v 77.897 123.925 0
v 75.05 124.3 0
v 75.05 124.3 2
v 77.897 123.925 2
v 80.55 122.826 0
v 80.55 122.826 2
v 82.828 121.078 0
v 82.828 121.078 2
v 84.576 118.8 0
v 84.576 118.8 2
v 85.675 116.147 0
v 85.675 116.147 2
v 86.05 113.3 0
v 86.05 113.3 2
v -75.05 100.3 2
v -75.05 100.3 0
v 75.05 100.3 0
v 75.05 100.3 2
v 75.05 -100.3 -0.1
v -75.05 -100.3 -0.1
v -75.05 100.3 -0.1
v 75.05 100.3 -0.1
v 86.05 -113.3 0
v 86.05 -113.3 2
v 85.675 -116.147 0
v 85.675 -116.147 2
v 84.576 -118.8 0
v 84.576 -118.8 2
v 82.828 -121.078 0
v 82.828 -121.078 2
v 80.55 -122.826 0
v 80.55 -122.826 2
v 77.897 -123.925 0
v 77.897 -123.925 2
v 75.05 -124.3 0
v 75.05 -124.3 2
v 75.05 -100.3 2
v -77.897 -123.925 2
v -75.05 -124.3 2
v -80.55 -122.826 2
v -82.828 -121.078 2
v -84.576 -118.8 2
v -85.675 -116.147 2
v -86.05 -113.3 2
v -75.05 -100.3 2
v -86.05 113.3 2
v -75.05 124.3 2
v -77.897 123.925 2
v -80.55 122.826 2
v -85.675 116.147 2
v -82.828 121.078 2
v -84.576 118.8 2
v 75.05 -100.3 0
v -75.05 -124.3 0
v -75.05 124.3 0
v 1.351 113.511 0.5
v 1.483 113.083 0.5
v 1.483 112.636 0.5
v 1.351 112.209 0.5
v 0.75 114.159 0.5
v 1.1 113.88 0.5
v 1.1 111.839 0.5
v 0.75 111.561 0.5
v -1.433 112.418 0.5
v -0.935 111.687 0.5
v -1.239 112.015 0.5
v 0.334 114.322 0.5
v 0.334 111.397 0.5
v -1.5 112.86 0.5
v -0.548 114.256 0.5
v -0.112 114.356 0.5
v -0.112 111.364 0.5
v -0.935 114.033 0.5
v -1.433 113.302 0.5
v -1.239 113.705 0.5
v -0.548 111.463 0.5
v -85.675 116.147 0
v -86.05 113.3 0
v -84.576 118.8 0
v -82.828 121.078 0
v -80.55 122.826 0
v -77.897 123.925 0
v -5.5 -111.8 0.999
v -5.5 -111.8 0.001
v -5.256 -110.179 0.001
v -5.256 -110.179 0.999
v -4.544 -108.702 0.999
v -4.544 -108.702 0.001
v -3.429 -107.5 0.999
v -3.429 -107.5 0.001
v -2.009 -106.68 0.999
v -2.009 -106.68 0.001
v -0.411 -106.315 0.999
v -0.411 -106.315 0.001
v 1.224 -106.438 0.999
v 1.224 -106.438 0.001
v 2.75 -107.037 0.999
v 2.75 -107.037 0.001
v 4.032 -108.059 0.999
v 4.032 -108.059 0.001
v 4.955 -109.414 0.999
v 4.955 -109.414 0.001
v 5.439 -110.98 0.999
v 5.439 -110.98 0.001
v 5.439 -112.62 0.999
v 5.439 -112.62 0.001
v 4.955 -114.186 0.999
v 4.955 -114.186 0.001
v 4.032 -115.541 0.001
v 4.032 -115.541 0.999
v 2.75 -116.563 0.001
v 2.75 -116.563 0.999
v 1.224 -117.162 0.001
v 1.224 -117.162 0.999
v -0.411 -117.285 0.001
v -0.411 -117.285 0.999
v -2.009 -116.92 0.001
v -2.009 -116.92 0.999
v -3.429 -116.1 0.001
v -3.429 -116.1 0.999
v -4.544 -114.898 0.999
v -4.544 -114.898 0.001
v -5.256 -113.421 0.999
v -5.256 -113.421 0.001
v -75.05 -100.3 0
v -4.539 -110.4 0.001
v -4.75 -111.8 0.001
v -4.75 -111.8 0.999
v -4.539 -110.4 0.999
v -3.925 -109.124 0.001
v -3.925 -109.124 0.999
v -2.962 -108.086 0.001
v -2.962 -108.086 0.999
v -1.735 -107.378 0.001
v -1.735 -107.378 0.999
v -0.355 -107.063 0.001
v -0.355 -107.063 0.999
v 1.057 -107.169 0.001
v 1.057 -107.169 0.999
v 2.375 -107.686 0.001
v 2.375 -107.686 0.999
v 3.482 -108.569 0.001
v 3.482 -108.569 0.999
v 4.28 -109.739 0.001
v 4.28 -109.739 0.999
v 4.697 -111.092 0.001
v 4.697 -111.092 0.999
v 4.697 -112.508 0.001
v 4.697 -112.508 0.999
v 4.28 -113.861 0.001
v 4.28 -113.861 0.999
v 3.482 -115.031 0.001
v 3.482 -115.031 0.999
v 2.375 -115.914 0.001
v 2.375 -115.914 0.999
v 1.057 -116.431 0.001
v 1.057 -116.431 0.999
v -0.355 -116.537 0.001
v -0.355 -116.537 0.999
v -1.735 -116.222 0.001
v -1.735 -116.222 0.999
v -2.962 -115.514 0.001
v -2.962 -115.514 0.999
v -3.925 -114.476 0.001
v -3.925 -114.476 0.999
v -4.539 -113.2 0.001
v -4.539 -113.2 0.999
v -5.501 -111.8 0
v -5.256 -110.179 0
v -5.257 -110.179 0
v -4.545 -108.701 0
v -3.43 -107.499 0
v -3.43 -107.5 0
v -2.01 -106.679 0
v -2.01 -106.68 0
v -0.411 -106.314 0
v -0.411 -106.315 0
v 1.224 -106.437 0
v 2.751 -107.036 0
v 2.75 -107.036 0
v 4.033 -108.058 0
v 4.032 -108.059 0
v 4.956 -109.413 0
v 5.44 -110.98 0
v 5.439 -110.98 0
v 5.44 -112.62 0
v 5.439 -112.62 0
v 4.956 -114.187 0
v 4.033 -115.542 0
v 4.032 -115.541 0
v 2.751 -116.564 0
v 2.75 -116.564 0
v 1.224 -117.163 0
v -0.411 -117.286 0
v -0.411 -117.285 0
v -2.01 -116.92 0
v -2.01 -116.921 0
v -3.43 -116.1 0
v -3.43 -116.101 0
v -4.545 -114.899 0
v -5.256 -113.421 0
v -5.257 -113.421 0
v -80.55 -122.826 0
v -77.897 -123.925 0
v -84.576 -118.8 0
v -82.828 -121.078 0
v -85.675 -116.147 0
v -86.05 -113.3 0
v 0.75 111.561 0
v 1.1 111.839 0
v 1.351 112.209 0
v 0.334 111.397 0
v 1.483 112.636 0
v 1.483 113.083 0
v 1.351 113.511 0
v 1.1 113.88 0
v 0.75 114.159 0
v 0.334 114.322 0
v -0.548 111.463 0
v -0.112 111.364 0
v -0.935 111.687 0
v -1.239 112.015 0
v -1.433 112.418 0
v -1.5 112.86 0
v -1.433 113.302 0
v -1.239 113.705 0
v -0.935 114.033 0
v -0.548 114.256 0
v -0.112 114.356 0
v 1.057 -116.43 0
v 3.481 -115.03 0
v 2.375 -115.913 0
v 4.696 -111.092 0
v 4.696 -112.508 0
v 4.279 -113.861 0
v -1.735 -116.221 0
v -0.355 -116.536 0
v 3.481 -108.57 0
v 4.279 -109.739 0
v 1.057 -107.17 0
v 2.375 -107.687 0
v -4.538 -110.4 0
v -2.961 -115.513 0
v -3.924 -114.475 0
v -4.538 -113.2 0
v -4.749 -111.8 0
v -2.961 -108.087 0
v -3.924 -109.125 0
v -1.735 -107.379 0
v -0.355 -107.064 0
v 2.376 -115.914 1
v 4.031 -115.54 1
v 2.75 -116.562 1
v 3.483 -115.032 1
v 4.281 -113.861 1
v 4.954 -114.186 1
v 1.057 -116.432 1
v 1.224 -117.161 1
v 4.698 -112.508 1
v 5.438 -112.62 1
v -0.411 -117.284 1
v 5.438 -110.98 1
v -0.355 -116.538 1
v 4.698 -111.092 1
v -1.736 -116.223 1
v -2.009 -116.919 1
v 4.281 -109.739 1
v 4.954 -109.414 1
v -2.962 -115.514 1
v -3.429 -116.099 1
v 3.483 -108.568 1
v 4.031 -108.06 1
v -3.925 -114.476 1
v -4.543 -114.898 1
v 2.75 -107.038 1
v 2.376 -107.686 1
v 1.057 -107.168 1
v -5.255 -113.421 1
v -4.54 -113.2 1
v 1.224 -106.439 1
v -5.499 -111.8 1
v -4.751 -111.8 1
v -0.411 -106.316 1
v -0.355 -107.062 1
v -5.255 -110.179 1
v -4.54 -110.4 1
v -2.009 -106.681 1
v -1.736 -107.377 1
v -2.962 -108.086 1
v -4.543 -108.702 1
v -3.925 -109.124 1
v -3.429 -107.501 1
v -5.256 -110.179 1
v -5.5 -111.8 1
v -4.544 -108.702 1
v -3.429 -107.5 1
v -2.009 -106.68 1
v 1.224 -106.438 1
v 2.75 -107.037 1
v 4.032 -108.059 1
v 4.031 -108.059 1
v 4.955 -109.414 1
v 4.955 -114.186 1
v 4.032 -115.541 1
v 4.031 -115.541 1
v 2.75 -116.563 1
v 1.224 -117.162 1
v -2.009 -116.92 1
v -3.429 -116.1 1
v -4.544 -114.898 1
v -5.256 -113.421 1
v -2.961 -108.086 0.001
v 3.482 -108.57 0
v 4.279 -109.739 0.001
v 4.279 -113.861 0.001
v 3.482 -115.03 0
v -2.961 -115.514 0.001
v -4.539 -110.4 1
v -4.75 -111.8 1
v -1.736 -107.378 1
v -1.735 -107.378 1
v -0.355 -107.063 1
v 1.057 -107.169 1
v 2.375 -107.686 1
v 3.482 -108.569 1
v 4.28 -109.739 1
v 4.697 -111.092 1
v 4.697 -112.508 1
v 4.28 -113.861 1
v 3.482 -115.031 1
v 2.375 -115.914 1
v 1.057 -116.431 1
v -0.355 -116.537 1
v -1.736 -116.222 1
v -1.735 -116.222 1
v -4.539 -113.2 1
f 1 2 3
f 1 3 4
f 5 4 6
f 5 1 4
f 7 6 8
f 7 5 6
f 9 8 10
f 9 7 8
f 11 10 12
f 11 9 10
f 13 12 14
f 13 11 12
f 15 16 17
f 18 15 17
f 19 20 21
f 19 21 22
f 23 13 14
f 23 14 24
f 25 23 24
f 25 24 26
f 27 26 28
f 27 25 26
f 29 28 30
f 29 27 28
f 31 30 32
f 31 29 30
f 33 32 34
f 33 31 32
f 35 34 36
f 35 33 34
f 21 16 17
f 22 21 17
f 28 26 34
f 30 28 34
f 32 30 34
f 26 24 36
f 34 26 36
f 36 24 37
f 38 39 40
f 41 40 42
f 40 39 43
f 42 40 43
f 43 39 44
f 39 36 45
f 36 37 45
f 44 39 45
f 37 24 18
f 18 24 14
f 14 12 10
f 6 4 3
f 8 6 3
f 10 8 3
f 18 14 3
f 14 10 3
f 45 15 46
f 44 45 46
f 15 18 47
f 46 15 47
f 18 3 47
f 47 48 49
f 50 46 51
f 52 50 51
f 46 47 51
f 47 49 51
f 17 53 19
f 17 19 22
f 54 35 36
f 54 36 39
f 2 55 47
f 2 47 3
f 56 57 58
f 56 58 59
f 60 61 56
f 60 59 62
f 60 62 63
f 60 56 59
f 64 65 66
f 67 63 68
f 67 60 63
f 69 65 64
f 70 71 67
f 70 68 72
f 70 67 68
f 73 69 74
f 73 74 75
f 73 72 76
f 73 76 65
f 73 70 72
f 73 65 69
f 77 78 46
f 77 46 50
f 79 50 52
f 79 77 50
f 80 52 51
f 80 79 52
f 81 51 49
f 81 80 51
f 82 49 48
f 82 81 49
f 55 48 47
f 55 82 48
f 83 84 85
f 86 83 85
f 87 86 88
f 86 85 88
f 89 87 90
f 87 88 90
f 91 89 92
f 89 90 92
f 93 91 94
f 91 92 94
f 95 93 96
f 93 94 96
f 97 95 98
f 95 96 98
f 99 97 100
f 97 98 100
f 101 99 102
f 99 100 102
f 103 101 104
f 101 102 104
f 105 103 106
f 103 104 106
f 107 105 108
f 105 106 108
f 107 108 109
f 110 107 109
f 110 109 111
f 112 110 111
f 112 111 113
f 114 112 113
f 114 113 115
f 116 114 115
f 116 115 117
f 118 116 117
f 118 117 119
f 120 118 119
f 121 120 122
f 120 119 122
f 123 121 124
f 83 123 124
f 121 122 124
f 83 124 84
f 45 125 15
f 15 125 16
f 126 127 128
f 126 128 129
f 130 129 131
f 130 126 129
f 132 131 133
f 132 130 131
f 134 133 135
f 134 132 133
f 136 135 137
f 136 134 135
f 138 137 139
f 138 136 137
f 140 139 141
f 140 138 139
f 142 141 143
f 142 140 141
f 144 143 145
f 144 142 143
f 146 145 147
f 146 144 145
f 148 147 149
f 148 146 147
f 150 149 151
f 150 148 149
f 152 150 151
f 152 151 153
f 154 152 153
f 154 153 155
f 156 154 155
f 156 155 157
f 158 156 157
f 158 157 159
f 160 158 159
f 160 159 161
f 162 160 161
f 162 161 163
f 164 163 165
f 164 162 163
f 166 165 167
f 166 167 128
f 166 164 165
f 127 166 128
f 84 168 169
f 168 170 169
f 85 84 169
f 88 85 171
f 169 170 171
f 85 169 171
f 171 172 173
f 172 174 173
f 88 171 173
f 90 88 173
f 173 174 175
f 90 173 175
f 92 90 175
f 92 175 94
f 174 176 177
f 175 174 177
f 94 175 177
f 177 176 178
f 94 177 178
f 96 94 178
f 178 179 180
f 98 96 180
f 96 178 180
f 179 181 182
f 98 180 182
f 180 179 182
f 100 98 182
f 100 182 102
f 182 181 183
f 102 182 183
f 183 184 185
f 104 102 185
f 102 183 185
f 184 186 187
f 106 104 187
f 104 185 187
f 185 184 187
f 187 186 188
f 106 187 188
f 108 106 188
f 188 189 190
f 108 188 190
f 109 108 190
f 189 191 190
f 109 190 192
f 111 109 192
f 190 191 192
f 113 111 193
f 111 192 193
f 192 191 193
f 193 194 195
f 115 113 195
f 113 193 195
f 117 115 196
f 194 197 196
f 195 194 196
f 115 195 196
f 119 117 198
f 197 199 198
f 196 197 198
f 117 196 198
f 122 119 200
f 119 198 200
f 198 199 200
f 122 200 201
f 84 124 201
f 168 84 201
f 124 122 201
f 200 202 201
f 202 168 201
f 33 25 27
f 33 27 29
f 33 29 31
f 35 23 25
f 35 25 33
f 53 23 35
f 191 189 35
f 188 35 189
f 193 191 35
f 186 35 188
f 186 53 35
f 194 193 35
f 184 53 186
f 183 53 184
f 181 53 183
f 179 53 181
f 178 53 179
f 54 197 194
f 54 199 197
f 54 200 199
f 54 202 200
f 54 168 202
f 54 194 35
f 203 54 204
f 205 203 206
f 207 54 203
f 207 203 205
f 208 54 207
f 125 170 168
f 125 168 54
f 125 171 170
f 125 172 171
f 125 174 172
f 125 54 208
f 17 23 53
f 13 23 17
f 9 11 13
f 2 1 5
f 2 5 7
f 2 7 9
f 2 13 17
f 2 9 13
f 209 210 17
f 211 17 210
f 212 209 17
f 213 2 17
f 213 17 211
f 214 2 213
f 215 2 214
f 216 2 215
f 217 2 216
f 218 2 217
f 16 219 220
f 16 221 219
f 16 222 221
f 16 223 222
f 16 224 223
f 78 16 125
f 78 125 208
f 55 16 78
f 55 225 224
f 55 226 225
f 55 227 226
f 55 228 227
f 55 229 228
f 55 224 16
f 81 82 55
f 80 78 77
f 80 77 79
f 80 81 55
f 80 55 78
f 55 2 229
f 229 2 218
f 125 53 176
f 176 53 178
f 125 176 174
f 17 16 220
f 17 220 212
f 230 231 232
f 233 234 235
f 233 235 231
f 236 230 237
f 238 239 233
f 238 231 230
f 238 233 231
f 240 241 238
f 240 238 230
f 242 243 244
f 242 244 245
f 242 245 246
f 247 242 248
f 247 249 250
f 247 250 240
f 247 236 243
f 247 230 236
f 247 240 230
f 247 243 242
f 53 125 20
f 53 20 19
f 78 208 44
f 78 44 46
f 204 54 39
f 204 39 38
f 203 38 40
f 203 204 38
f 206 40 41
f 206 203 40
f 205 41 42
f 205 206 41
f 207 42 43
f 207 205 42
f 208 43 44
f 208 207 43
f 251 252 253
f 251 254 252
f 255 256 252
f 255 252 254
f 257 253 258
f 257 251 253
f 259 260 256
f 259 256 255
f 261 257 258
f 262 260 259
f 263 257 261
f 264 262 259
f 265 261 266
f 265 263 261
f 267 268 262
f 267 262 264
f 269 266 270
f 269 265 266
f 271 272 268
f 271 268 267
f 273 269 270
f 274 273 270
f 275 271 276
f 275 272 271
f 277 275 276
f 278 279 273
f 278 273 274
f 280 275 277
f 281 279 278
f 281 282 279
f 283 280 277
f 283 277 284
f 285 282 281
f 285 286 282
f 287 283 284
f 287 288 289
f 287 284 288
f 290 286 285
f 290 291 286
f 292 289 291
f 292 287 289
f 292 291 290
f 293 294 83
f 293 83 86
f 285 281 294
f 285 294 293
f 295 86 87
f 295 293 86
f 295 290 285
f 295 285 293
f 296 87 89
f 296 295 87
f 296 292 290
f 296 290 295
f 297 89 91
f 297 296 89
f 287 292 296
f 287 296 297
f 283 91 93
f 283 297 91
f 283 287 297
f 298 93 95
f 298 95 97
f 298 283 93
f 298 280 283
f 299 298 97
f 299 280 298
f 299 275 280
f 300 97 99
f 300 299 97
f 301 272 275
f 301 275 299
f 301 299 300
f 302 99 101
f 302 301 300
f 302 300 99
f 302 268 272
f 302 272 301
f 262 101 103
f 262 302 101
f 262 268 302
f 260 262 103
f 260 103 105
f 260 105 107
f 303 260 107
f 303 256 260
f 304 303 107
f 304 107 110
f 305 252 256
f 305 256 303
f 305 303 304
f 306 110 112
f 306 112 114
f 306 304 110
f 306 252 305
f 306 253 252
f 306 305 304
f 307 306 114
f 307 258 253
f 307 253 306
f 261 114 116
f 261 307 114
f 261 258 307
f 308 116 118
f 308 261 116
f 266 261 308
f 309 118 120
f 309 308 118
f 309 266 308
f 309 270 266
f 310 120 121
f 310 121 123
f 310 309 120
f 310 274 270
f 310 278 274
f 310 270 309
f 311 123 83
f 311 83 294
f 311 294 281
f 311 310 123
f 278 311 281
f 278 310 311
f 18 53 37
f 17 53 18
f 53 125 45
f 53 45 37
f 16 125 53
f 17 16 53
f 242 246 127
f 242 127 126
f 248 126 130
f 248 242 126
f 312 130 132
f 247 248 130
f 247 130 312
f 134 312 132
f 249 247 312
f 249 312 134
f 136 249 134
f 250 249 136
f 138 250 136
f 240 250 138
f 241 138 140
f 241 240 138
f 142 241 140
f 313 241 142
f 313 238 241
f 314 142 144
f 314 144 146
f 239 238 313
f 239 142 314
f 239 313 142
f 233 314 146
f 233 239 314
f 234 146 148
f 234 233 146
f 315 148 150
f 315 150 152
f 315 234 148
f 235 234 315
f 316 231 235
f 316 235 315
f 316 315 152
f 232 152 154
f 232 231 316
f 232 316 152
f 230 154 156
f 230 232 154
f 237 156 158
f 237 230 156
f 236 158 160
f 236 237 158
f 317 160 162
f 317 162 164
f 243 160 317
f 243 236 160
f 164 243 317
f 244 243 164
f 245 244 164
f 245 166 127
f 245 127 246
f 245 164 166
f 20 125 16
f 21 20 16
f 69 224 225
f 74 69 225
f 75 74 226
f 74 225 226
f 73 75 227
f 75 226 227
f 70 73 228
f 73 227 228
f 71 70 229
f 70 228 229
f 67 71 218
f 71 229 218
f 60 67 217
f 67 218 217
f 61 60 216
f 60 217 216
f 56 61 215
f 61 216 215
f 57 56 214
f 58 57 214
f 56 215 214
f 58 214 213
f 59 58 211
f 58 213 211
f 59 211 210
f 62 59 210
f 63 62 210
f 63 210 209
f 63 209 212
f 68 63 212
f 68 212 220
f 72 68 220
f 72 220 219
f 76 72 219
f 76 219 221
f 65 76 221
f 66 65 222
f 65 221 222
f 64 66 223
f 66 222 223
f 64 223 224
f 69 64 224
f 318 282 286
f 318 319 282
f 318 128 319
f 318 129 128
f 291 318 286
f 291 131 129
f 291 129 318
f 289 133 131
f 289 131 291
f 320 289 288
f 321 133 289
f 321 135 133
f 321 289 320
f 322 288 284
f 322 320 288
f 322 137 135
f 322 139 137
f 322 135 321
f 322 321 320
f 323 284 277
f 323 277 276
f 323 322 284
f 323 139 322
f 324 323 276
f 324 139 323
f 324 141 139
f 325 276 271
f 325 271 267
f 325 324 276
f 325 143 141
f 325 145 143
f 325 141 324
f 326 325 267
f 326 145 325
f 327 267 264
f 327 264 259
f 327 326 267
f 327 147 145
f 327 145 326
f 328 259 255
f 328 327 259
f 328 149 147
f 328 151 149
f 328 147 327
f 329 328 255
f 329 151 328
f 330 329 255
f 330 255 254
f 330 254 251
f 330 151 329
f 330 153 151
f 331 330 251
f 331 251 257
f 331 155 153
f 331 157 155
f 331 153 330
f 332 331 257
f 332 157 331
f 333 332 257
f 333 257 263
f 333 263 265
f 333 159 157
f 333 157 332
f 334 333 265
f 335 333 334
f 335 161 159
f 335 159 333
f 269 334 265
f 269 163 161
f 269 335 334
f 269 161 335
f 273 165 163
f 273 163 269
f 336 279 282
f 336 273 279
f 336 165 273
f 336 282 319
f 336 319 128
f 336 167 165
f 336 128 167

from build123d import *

# Parameters (mm, degrees)
SKETCH2_W           = 150.1
SKETCH2_H           = 200.6
BOSS_EXTRUDE1_DEPTH = 2
SKETCH3_W           = 150.1
SKETCH3_H           = 200.6
BOSS_EXTRUDE2_DEPTH = 0.1
SKETCH4_R           = 5.5
SKETCH4_R_2         = 4.75
CUT_EXTRUDE1_DEPTH  = 1
FILLET1_R           = 0.001
FILLET2_R           = 0.001
FILLET3_R           = 0.001
FILLET4_R           = 0.001
SKETCH5_R           = 1.5
CUT_EXTRUDE3_DEPTH  = 0.5


with BuildPart() as part:
    # Sketch2 → Boss-Extrude1 (new body)
    with BuildSketch(Plane.XY):
        with BuildLine():
            Line((-75.05, 124.3), (75.05, 124.3))
            ThreePointArc((75.05, 124.3), (82.828174593, 121.078174593), (86.05, 113.3))
            Line((86.05, 113.3), (86.05, -113.3))
            ThreePointArc((86.05, -113.3), (82.828174593, -121.078174593), (75.05, -124.3))
            Line((75.05, -124.3), (-75.05, -124.3))
            ThreePointArc((-75.05, -124.3), (-82.828174593, -121.078174593), (-86.05, -113.3))
            Line((-86.05, -113.3), (-86.05, 113.3))
            ThreePointArc((-86.05, 113.3), (-82.828174593, 121.078174593), (-75.05, 124.3))
        make_face()
        Rectangle(SKETCH2_W, SKETCH2_H, mode=Mode.SUBTRACT)
    extrude(amount=BOSS_EXTRUDE1_DEPTH)

    # Sketch4 → Cut-Extrude1 (cut)
    with BuildSketch(Plane(origin=(0, 0, 0), x_dir=(-1, 0, 0), z_dir=(0, 0, -1))):
        with Locations((0, -111.8)):
            Circle(SKETCH4_R)
        with Locations((0, -111.8)):
            Circle(SKETCH4_R_2, mode=Mode.SUBTRACT)
    extrude(amount=-CUT_EXTRUDE1_DEPTH, mode=Mode.SUBTRACT)

    # Fillet1
    fillet1_edges = [part.edges().sort_by_distance(p)[0] for p in [
        (4.75, -111.8, 0),
    ]]
    fillet(fillet1_edges, radius=FILLET1_R)

    # Fillet2
    fillet2_edges = [part.edges().sort_by_distance(p)[0] for p in [
        (5.5, -111.8, 0),
    ]]
    fillet(fillet2_edges, radius=FILLET2_R)

    # Fillet3
    fillet3_edges = [part.edges().sort_by_distance(p)[0] for p in [
        (5.5, -111.8, 1),
    ]]
    fillet(fillet3_edges, radius=FILLET3_R)

    # Fillet4
    fillet4_edges = [part.edges().sort_by_distance(p)[0] for p in [
        (4.75, -111.8, 1),
    ]]
    fillet(fillet4_edges, radius=FILLET4_R)

    # Sketch5 → Cut-Extrude3 (cut)
    with BuildSketch(Plane(origin=(0, 0, 0), x_dir=(-1, 0, 0), z_dir=(0, 0, -1))):
        with Locations((0, 112.859757772)):
            Circle(SKETCH5_R)
    extrude(amount=-CUT_EXTRUDE3_DEPTH, mode=Mode.SUBTRACT)


with BuildPart() as body_2:
    # Sketch3 → Boss-Extrude2 (new body)
    with BuildSketch(Plane.XY):
        Rectangle(SKETCH3_W, SKETCH3_H)
    extrude(amount=-BOSS_EXTRUDE2_DEPTH)


solid = Compound([part.part, body_2.part])
